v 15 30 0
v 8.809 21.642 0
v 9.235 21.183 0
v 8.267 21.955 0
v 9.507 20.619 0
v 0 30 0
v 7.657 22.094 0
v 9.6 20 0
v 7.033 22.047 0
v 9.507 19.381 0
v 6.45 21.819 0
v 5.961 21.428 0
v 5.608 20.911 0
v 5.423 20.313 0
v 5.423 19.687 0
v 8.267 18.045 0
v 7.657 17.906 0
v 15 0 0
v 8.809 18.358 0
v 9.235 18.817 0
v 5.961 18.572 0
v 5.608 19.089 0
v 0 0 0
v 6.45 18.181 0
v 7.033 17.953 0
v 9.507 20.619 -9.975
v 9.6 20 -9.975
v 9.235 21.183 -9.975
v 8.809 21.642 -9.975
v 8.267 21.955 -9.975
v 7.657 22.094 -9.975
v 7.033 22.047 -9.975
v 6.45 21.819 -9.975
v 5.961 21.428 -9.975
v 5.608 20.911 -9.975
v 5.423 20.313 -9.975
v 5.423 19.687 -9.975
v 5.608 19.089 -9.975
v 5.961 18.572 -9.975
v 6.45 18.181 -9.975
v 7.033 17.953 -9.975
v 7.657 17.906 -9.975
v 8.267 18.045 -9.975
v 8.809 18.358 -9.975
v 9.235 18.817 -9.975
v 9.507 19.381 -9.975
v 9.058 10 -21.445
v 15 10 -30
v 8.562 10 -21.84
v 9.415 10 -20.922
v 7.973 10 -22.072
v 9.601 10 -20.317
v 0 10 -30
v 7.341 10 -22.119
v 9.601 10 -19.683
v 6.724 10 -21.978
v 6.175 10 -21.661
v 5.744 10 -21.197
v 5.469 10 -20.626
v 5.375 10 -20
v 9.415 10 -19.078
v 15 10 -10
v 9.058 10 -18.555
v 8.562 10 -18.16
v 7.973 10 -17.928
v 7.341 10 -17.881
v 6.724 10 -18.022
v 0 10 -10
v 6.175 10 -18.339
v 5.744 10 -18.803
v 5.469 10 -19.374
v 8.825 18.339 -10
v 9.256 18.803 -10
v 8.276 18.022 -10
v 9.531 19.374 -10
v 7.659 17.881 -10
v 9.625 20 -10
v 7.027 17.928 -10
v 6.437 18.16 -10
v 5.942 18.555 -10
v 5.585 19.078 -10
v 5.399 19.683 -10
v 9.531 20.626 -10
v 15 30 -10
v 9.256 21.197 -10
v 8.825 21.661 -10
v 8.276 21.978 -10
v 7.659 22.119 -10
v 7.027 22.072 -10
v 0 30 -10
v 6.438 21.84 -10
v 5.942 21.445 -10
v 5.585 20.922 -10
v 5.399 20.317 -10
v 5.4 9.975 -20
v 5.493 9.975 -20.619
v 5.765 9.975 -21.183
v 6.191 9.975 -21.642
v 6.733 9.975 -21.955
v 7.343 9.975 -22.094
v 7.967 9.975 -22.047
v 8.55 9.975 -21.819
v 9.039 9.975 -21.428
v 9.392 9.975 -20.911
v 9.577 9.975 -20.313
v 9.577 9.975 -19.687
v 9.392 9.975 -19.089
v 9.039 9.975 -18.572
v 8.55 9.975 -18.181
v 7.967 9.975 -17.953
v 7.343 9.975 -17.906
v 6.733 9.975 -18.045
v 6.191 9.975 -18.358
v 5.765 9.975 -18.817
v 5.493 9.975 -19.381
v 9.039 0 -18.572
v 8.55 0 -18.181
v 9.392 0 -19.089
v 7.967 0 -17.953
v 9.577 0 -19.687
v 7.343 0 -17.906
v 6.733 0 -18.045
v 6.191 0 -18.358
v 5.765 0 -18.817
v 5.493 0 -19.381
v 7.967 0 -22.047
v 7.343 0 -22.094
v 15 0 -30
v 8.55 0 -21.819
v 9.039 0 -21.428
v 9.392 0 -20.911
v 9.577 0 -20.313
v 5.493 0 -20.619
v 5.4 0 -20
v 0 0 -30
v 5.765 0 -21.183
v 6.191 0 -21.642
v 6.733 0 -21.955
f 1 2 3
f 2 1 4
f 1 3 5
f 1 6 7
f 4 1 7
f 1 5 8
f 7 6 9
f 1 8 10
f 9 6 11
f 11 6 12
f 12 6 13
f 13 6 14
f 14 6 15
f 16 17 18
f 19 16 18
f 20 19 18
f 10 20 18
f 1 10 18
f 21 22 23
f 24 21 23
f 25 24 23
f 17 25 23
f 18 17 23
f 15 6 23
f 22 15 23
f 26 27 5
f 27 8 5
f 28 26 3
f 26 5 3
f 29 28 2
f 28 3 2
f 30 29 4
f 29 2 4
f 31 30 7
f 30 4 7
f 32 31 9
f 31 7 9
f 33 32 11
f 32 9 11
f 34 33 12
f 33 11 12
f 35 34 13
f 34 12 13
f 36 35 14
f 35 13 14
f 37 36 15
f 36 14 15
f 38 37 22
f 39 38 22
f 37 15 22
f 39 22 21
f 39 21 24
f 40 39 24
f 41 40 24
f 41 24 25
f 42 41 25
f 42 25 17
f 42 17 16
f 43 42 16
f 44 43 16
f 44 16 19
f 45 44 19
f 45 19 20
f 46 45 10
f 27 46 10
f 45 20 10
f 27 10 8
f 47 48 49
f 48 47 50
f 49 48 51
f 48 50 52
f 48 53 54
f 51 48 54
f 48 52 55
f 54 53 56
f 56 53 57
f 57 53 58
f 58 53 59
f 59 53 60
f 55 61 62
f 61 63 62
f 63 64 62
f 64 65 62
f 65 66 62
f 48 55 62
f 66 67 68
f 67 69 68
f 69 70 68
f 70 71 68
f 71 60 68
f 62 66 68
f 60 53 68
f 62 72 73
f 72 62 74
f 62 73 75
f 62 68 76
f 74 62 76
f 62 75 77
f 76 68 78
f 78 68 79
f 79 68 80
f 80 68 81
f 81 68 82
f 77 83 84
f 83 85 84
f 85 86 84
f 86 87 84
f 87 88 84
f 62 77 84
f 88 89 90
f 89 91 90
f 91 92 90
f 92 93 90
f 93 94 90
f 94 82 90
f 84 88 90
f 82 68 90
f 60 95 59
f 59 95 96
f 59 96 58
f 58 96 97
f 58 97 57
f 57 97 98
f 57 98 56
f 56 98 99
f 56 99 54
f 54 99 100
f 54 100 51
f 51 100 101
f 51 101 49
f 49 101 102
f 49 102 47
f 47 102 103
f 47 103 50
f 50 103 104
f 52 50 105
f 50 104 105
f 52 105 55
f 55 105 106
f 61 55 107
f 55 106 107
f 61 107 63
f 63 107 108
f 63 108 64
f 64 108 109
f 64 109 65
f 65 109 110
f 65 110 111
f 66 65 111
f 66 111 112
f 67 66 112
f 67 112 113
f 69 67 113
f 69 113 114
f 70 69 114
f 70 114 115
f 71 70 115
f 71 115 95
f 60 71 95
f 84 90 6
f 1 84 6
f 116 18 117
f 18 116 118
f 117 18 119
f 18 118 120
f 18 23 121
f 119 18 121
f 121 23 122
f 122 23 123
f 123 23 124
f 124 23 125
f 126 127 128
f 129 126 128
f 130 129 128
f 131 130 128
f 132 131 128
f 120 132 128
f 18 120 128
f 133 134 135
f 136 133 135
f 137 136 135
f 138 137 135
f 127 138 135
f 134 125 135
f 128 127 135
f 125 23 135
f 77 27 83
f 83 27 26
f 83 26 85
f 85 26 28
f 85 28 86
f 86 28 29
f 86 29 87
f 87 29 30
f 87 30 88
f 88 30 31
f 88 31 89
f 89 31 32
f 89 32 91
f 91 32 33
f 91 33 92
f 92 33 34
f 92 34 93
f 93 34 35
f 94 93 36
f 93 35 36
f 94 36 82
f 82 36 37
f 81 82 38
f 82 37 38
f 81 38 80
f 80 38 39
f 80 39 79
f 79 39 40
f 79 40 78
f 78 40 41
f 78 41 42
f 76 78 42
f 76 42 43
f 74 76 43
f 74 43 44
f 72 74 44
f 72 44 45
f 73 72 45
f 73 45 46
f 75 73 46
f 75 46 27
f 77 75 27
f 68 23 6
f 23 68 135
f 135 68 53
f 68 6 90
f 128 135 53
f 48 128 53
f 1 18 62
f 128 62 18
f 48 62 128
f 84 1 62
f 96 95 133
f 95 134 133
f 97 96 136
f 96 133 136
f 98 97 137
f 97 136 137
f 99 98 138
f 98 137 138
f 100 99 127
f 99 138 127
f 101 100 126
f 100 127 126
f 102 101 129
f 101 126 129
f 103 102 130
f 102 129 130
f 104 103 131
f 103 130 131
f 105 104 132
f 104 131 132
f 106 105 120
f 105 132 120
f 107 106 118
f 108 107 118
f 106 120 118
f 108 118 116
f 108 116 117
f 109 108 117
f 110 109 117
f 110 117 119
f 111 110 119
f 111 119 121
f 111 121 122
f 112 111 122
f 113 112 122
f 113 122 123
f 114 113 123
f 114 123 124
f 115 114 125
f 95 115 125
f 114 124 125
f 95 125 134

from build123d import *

# Parameters (mm, degrees)
BOSS_EXTRUDE2_DEPTH                   = 15
TAP_DRILL_FOR_M5X0_8_TAP3_D           = 4.2
TAP_DRILL_FOR_M5X0_8_TAP3_CSINK_D     = 4.25
TAP_DRILL_FOR_M5X0_8_TAP3_CSINK_ANGLE = 90
TAP_DRILL_FOR_M5X0_8_TAP4_D           = 4.2
TAP_DRILL_FOR_M5X0_8_TAP4_CSINK_D     = 4.25
TAP_DRILL_FOR_M5X0_8_TAP4_CSINK_ANGLE = 90


with BuildPart() as part:
    # Sketch8 → Boss-Extrude2 (new body)
    with BuildSketch(Plane(origin=(0, 0, 0), x_dir=(0, 0, -1), z_dir=(1, 0, 0))):
        Polygon((0, 30), (0, 0), (30, 0), (30, 10), (10, 10), (10, 30), align=None)
    extrude(amount=BOSS_EXTRUDE2_DEPTH)

    # Tap Drill for M5x0.8 Tap3 (through all)
    with Locations(Plane(origin=(0, 10, 0), x_dir=(1, 0, 0), z_dir=(0, 1, 0))):
        with Locations((7.5, 20)):
            CounterSinkHole(TAP_DRILL_FOR_M5X0_8_TAP3_D / 2, TAP_DRILL_FOR_M5X0_8_TAP3_CSINK_D / 2, counter_sink_angle=TAP_DRILL_FOR_M5X0_8_TAP3_CSINK_ANGLE)

    # Tap Drill for M5x0.8 Tap4 (through all)
    with Locations(Plane(origin=(0, 0, -10), x_dir=(-1, 0, 0), z_dir=(0, 0, -1))):
        with Locations((-7.5, 20)):
            CounterSinkHole(TAP_DRILL_FOR_M5X0_8_TAP4_D / 2, TAP_DRILL_FOR_M5X0_8_TAP4_CSINK_D / 2, counter_sink_angle=TAP_DRILL_FOR_M5X0_8_TAP4_CSINK_ANGLE)


solid = part.part
